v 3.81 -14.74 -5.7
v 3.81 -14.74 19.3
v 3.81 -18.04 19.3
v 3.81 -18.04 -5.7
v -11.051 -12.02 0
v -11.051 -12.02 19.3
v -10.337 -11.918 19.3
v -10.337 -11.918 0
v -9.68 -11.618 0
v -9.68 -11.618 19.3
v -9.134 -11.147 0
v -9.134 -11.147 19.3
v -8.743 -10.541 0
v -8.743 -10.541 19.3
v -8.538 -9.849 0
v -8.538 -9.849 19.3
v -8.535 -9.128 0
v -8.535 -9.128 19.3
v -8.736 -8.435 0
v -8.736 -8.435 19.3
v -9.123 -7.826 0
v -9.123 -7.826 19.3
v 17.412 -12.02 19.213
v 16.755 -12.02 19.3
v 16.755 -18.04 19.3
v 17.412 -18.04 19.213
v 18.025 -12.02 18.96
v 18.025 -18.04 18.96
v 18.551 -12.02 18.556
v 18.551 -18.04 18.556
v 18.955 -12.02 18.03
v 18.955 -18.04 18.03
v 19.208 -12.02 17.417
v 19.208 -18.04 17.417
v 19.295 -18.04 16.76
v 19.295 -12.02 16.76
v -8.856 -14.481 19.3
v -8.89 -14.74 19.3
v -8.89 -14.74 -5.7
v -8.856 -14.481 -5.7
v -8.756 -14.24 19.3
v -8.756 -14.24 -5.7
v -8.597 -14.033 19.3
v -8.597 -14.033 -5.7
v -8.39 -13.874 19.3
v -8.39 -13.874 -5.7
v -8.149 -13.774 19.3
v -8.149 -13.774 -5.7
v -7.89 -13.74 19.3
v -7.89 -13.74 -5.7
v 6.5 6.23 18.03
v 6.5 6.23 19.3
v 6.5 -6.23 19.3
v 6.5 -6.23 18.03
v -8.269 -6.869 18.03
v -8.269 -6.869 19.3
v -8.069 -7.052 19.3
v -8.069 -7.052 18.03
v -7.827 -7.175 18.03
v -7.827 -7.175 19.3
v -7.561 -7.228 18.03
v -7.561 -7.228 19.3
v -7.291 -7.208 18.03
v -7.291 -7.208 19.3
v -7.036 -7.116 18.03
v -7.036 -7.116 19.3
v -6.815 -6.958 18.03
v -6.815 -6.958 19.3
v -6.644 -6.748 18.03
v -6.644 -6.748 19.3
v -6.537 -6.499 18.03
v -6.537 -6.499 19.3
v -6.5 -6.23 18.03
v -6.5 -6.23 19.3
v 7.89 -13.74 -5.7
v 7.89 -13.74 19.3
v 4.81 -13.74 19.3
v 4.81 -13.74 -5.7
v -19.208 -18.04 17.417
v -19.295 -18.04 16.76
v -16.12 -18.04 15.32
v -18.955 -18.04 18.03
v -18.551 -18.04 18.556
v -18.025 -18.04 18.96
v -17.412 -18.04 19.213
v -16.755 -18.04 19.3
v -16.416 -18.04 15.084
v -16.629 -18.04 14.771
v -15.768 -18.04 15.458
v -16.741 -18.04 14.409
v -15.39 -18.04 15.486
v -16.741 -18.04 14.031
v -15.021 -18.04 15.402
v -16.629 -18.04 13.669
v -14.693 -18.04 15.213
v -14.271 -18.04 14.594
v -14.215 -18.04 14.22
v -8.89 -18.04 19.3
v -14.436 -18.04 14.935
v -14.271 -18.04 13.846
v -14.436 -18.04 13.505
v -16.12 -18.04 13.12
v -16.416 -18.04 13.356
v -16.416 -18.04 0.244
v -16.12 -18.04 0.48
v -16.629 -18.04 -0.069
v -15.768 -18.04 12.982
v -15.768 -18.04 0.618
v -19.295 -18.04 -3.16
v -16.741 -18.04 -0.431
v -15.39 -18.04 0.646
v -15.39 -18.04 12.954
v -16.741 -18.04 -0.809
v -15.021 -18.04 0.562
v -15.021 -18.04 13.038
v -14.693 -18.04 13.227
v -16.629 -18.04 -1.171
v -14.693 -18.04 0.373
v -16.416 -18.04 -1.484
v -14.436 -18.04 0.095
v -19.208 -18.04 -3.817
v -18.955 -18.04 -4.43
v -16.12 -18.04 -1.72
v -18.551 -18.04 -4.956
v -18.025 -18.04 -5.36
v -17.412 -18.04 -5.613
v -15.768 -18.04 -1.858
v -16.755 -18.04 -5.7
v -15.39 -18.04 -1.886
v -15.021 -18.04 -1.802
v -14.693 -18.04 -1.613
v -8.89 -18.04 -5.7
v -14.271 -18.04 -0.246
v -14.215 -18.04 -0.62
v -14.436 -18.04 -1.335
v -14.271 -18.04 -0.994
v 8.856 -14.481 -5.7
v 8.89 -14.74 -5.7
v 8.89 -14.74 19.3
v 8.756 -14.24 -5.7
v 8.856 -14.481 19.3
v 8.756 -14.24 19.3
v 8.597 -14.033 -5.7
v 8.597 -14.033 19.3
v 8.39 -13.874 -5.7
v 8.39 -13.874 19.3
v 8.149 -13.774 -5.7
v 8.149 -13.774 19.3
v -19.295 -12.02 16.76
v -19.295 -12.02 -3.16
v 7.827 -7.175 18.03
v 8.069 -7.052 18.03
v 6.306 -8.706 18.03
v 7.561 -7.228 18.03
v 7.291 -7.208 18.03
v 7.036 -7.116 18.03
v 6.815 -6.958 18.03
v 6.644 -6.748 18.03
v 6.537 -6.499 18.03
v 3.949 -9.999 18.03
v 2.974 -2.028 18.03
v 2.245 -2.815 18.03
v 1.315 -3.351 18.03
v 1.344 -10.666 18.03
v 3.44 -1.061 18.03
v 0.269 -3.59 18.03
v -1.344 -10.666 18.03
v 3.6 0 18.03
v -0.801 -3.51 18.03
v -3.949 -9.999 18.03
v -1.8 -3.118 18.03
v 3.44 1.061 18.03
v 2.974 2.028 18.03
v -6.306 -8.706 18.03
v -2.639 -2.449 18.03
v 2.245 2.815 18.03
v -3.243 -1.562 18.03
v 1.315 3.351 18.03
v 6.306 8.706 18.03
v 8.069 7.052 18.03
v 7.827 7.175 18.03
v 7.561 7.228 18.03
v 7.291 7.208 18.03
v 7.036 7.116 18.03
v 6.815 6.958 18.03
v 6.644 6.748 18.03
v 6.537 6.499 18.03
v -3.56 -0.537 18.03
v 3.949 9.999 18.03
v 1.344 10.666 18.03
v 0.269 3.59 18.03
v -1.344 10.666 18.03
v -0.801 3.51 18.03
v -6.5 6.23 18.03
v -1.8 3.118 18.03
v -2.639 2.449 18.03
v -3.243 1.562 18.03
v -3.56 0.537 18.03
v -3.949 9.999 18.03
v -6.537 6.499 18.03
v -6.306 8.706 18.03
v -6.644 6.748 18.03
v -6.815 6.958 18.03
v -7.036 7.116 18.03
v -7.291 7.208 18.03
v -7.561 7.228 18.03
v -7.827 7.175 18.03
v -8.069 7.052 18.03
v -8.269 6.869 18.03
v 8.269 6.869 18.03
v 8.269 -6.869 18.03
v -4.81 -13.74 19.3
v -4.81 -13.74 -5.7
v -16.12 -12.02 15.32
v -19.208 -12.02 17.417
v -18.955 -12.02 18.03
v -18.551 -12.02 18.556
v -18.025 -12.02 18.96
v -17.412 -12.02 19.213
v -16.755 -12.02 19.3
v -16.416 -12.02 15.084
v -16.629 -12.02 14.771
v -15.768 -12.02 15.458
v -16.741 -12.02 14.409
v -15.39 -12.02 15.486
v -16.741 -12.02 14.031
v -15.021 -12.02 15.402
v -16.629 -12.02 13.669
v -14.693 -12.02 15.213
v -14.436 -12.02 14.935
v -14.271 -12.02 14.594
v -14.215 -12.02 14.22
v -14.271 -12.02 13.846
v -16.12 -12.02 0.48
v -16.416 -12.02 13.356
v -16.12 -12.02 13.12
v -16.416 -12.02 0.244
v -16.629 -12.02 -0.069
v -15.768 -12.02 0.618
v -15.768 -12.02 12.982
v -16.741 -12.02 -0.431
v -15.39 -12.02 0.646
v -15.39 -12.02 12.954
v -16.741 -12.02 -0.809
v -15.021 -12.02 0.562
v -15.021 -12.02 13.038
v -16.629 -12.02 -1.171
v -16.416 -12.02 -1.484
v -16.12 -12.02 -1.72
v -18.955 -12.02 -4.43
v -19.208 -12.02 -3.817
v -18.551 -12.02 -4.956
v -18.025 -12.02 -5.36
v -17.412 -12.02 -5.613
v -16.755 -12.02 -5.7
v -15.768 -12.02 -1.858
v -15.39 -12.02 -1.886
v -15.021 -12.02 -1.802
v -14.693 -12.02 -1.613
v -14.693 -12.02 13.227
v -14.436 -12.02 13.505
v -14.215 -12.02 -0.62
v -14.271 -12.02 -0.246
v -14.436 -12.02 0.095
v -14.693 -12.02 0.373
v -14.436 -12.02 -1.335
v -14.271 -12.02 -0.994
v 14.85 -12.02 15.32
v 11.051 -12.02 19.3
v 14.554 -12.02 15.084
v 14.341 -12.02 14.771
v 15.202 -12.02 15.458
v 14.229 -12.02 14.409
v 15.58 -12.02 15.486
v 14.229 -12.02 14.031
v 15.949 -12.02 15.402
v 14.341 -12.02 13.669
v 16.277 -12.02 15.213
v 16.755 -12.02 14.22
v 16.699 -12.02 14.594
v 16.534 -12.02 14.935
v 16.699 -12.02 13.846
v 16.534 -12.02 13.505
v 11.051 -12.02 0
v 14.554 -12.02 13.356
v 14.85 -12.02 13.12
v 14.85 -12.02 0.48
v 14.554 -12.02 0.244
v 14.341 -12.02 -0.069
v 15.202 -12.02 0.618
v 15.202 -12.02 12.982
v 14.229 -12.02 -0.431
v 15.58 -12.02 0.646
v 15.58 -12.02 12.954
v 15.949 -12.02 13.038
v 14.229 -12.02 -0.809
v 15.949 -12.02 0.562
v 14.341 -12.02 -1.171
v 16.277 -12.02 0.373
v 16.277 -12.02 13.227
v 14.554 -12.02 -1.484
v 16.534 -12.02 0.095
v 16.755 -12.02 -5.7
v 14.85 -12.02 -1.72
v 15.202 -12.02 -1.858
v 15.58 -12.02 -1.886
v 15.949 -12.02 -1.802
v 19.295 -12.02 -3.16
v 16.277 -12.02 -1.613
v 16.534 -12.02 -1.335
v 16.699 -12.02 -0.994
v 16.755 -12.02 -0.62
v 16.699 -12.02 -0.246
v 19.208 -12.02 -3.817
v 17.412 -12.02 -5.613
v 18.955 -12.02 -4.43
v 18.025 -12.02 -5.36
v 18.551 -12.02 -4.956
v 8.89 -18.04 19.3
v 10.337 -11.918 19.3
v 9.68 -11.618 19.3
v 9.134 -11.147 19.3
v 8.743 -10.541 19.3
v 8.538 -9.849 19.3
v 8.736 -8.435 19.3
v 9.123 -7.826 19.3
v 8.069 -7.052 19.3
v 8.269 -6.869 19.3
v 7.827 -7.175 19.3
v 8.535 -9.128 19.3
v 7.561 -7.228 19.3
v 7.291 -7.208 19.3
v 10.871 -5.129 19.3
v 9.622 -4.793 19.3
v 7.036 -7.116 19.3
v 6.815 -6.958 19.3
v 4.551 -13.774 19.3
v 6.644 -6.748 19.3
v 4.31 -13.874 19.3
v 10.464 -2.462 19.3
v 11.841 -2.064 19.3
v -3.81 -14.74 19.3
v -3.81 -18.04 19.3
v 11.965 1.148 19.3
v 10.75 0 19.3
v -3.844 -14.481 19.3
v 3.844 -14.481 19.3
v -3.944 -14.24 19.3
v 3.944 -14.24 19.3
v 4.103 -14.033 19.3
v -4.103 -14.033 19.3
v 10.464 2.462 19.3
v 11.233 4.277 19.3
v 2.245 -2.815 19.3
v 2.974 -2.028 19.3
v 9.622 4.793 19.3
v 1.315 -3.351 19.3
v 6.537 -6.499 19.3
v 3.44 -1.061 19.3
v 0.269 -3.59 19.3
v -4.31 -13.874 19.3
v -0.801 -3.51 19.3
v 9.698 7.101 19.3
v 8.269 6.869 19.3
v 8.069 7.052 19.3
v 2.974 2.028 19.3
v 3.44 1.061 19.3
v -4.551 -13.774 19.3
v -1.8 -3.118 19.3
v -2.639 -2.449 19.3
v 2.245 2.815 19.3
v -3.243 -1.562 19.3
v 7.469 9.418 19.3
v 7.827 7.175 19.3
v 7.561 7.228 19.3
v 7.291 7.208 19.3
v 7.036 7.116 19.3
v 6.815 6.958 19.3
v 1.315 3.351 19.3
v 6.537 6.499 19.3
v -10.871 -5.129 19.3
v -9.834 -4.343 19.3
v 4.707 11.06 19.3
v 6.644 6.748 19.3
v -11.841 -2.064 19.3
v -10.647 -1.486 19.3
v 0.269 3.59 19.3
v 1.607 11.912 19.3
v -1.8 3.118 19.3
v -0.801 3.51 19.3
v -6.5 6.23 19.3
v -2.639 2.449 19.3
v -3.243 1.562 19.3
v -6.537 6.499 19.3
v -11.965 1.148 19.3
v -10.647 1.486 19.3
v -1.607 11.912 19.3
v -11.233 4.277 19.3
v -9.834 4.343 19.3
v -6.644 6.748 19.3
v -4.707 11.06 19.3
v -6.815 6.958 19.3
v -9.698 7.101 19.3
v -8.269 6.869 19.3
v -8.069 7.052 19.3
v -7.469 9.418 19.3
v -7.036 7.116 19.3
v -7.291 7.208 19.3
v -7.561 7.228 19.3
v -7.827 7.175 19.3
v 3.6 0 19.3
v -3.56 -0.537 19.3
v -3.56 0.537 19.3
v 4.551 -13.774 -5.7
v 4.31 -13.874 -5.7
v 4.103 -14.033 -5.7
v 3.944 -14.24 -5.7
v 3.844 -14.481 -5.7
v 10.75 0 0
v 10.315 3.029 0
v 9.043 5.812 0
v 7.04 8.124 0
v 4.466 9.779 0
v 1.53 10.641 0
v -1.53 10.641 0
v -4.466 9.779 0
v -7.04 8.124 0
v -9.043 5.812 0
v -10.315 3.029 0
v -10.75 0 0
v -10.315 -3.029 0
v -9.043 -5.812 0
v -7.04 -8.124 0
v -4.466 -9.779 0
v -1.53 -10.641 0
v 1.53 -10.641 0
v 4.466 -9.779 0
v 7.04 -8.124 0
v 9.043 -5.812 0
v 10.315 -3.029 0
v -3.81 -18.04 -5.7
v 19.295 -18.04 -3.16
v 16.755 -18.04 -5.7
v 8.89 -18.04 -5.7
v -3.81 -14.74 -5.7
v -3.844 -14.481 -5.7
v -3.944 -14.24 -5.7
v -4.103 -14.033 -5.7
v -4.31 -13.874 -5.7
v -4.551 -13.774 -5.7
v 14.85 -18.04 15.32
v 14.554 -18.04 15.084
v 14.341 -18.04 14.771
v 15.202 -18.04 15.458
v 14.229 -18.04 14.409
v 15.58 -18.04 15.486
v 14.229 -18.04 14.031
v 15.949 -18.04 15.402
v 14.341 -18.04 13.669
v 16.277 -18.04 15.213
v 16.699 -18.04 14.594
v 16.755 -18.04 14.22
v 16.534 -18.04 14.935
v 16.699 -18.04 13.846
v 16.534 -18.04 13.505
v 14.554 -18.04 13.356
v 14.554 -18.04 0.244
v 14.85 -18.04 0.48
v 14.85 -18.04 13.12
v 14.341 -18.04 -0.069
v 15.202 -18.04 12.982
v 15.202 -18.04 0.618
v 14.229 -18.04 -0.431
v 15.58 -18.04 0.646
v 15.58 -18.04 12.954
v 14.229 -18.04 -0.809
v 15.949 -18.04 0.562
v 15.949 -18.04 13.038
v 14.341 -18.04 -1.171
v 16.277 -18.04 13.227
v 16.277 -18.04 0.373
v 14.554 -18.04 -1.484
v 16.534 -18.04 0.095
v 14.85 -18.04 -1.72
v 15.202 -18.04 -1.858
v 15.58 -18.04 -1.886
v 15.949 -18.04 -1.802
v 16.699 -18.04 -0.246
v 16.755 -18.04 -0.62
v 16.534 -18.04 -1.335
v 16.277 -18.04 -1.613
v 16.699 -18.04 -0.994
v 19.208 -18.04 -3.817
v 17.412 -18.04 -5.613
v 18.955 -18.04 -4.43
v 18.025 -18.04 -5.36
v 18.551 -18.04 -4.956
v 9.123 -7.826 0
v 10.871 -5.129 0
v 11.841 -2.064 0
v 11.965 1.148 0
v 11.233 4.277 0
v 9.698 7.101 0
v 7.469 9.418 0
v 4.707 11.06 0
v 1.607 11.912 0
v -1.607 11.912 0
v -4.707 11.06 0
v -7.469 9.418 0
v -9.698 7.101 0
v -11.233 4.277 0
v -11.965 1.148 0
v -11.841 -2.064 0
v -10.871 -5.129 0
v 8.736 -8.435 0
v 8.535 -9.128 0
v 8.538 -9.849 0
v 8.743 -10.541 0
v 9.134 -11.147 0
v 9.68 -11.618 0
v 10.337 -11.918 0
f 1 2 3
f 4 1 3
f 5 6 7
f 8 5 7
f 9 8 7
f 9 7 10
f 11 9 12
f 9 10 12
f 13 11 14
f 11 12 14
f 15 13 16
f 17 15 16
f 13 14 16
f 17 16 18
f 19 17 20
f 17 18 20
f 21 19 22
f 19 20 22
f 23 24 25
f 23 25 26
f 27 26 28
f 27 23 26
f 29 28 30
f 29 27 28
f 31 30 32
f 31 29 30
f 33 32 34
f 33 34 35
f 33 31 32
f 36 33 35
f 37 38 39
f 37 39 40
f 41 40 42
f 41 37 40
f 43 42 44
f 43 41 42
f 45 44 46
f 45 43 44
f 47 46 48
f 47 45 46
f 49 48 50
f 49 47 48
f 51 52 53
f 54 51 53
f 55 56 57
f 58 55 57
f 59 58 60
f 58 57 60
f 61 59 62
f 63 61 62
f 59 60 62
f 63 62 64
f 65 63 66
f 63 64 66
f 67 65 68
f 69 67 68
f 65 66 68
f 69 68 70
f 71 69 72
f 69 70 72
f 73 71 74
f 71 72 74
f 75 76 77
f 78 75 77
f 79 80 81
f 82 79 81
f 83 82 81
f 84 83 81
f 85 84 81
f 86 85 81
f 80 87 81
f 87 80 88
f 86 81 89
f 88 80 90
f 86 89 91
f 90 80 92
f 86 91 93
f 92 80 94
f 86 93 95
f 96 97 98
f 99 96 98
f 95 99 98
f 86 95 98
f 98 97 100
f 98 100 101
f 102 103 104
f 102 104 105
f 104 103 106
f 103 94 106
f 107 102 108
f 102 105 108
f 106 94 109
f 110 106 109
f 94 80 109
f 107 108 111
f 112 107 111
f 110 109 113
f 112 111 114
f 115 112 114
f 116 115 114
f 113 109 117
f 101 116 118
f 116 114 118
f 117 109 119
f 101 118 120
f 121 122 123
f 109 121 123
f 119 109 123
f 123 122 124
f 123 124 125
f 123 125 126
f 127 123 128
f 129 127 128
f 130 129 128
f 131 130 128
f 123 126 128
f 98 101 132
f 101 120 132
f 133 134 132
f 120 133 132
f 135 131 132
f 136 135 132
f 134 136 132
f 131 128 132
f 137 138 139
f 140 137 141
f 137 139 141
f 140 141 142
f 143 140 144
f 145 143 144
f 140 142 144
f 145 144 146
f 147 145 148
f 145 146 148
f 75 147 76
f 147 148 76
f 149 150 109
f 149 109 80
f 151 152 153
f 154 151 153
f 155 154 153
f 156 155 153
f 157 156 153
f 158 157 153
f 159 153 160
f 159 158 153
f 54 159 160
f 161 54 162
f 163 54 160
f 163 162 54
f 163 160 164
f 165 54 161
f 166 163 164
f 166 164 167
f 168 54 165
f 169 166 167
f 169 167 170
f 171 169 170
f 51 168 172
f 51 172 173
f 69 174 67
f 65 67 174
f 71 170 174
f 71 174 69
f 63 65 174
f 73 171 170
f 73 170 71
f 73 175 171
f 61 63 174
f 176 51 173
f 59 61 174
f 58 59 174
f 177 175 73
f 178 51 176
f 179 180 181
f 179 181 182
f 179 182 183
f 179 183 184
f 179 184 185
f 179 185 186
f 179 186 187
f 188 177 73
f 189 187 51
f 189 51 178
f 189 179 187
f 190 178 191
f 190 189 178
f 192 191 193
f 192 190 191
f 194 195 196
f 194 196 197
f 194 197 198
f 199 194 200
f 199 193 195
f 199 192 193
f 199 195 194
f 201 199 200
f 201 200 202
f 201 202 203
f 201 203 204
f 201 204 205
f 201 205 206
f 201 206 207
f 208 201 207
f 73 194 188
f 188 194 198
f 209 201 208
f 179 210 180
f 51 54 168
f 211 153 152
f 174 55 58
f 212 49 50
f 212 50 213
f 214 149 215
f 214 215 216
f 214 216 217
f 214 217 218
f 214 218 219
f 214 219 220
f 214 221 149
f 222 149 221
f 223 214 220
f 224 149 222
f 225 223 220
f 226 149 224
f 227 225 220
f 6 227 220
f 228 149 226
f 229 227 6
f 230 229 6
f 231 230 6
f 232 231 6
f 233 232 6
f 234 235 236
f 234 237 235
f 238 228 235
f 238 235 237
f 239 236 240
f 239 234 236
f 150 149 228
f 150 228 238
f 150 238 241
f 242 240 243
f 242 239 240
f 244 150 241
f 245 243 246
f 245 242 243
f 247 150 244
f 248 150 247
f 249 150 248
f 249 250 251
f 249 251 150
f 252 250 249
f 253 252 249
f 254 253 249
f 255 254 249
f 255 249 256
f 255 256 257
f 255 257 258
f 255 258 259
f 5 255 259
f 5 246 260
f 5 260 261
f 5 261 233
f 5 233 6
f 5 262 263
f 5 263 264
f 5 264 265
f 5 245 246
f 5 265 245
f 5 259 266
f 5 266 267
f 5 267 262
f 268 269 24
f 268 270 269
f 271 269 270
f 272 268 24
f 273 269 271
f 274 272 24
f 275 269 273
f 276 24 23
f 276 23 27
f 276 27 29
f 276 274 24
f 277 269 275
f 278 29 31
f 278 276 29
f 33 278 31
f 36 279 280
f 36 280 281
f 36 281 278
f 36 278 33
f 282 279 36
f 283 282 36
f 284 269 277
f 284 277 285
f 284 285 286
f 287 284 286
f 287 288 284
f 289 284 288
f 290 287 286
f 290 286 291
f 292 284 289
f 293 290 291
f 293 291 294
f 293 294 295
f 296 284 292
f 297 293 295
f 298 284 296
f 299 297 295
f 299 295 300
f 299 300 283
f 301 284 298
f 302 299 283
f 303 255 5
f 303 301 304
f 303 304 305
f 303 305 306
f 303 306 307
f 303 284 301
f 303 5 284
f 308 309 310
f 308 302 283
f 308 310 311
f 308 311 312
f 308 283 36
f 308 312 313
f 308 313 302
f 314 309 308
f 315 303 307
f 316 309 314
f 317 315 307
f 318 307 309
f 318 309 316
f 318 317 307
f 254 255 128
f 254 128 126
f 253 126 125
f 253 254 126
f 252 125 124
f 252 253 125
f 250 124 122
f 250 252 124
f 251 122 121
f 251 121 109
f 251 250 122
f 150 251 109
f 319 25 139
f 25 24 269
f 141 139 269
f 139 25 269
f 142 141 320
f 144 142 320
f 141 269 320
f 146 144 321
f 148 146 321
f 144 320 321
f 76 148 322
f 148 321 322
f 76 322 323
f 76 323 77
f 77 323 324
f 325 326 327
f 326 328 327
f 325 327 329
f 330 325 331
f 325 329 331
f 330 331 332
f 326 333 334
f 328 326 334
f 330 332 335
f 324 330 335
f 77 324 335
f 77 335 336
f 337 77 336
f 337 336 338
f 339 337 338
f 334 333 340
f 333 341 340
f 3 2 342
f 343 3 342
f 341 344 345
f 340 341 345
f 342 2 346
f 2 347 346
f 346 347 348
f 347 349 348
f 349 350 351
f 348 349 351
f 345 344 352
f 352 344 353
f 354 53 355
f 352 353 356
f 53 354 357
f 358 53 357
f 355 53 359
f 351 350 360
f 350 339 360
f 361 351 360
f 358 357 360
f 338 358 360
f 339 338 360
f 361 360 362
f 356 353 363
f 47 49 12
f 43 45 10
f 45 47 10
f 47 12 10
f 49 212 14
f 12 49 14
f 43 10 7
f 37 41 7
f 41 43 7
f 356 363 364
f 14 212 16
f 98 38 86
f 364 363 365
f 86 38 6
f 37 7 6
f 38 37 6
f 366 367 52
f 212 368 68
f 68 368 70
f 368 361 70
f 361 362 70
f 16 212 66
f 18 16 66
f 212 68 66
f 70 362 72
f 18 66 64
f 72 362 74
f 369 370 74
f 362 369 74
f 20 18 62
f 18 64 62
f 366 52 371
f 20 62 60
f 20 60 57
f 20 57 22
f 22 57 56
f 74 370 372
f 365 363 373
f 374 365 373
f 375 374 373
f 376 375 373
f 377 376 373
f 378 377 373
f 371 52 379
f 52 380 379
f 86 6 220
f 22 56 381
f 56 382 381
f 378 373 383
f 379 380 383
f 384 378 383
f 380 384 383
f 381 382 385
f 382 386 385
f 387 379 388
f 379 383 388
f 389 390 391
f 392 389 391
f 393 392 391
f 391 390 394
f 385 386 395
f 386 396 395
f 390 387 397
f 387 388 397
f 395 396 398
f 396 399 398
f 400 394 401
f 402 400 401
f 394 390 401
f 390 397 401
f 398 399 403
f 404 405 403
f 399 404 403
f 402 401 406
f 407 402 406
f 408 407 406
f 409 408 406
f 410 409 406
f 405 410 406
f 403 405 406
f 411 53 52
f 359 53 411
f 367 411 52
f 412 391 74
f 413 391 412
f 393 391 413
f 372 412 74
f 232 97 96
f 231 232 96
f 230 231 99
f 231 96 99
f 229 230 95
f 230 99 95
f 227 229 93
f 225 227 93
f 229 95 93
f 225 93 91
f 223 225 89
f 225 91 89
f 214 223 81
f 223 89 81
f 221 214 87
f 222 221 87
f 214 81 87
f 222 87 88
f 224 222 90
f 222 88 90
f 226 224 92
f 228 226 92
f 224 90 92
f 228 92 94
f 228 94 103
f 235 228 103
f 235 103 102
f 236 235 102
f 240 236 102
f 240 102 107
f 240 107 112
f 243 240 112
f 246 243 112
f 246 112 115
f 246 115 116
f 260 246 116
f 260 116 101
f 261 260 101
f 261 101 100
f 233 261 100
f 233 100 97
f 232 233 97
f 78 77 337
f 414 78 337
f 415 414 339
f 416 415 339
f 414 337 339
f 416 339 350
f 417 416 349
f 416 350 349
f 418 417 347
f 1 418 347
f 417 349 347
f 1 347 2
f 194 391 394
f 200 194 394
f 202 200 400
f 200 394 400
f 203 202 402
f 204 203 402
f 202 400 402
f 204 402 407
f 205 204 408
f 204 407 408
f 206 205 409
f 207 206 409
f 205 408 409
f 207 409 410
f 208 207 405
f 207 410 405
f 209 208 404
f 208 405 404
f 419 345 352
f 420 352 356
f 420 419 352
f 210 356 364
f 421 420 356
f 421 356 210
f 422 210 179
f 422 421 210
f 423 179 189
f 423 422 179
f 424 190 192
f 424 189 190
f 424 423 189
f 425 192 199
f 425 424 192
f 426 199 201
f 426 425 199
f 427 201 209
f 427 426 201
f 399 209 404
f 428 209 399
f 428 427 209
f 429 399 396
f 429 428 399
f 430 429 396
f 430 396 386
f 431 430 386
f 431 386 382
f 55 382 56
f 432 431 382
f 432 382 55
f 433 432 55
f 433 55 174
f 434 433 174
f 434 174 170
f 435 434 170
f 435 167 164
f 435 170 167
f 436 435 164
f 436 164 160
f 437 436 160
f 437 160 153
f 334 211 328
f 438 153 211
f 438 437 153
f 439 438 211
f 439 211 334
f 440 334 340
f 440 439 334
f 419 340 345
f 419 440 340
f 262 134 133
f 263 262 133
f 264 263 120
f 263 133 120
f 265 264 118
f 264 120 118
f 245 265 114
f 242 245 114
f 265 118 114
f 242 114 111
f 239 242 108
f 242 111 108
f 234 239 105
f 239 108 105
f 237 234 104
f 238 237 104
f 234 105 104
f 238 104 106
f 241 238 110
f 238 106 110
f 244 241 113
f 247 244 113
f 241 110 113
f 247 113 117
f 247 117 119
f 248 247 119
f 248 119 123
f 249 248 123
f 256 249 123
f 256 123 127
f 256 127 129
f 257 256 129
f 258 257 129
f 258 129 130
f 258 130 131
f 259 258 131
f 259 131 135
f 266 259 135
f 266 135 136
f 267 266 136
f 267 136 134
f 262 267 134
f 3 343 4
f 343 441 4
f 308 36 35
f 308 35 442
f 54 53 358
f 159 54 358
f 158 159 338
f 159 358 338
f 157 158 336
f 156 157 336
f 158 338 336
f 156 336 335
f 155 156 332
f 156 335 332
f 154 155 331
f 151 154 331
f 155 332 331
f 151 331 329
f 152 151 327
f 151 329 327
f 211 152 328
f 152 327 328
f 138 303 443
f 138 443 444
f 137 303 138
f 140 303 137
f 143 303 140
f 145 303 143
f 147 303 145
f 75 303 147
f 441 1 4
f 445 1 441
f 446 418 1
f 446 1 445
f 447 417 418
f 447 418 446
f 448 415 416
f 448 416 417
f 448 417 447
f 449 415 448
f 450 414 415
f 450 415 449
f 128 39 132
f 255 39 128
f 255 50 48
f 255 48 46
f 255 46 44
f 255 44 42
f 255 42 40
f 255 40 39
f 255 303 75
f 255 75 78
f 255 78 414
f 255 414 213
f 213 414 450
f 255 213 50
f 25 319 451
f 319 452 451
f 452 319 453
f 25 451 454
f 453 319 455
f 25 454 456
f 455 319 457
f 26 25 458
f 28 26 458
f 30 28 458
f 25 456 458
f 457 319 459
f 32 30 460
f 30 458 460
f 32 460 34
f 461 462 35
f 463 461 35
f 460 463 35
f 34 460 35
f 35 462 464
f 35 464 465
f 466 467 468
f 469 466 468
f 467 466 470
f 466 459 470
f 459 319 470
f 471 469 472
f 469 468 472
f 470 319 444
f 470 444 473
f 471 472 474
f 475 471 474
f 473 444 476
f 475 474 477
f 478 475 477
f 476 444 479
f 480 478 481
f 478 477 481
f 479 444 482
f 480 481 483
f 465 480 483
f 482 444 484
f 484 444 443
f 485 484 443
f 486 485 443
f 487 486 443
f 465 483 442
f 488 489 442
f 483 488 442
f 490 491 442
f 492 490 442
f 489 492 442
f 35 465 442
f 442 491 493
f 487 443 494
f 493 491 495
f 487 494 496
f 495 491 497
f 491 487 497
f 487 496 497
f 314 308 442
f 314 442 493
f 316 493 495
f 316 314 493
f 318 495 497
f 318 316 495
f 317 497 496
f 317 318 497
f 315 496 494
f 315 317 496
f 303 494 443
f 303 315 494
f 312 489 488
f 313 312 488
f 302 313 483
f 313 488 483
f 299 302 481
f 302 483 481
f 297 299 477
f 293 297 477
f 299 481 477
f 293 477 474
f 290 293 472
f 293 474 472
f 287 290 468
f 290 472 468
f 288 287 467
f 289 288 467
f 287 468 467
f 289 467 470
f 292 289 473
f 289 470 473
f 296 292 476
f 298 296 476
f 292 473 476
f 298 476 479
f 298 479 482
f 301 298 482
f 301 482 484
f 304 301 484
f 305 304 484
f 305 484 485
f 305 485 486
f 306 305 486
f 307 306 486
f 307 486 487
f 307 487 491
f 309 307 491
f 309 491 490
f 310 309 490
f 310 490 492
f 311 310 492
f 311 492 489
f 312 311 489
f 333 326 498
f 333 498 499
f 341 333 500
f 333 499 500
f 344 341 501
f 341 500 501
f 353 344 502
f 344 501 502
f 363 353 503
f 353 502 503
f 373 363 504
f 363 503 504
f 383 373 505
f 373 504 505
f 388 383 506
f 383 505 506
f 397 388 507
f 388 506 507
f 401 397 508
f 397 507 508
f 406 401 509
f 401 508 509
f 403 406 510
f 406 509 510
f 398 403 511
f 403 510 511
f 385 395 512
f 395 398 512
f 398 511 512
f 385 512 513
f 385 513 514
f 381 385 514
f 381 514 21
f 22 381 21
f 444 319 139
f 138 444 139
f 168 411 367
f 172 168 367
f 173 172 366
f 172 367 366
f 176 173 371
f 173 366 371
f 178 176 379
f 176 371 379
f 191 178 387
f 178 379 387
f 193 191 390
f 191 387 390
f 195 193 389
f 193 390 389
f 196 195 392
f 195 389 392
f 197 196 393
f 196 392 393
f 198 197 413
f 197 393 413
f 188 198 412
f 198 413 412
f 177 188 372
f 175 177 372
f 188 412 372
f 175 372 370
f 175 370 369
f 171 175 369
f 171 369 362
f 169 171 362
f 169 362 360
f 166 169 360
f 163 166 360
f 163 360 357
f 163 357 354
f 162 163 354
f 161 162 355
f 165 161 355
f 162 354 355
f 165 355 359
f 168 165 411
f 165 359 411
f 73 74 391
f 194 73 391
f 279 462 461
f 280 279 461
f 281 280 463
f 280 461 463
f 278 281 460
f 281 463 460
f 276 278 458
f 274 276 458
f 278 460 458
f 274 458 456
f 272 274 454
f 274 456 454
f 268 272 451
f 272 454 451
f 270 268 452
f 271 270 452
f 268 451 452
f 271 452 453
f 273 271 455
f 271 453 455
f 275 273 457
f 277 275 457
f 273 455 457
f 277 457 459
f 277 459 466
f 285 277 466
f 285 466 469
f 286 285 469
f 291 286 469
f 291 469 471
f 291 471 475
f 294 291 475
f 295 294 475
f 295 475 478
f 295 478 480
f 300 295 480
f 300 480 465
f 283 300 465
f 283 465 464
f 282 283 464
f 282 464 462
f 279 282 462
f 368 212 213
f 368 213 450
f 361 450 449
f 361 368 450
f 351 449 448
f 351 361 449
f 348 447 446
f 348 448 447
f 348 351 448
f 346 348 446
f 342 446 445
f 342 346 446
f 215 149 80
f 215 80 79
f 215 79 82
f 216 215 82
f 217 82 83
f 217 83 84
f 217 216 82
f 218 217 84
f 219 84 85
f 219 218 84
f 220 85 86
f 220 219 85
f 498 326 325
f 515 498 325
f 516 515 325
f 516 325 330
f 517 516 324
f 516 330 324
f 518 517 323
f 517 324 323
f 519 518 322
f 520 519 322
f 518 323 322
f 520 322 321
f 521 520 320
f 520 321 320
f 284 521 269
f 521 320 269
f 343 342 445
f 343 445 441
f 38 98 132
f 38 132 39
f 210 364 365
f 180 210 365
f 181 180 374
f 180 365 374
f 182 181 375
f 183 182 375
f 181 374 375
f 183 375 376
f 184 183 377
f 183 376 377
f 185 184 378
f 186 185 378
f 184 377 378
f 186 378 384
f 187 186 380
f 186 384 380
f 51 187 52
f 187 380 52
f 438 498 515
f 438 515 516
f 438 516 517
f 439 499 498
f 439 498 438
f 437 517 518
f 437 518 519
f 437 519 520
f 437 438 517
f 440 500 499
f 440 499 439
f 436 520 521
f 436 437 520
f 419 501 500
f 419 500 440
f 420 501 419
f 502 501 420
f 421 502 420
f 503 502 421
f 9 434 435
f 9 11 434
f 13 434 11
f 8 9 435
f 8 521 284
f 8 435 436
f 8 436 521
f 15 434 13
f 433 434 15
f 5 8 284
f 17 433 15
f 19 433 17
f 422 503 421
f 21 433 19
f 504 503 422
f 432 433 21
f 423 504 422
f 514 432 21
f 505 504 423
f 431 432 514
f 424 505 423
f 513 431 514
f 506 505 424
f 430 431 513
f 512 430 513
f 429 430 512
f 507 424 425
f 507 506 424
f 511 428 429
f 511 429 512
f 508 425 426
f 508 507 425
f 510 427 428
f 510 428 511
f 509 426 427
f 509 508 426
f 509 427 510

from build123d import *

# Parameters (mm, degrees)
SKETCH2_R           = 12.02
SKETCH2_R_2         = 10.75
BOSS_EXTRUDE1_DEPTH = 19.3
SKETCH3_R           = 3.6
BOSS_EXTRUDE4_DEPTH = 1.27
BOSS_EXTRUDE5_DEPTH = 6.02
BOSS_EXTRUDE6_DEPTH = 19.3
CUT_EXTRUDE1_DEPTH  = 26
SKETCH7_R           = 1.27
CUT_EXTRUDE2_DEPTH  = 31.06


with BuildPart() as part:
    # Sketch2 → Boss-Extrude1 (new body)
    with BuildSketch(Plane.XY):
        Circle(SKETCH2_R)
        Circle(SKETCH2_R_2, mode=Mode.SUBTRACT)
    extrude(amount=BOSS_EXTRUDE1_DEPTH)

    # Sketch3 → Boss-Extrude4 (add)
    with BuildSketch(Plane.XY.offset(19.3)):
        with BuildLine():
            Line((-6.5, -6.229967897), (-6.5, 6.229967897))
            ThreePointArc((-6.5, 6.229967897), (-7.16031689, 7.17050784), (-8.269230769, 6.868938964))
            ThreePointArc((-8.269230769, 6.868938964), (0, 10.75), (8.269230769, 6.868938964))
            ThreePointArc((8.269230769, 6.868938964), (7.16031689, 7.17050784), (6.5, 6.229967897))
            Line((6.5, 6.229967897), (6.5, -6.229967897))
            ThreePointArc((6.5, -6.229967897), (7.16031689, -7.17050784), (8.269230769, -6.868938964))
            ThreePointArc((8.269230769, -6.868938964), (0, -10.75), (-8.269230769, -6.868938964))
            ThreePointArc((-8.269230769, -6.868938964), (-7.16031689, -7.17050784), (-6.5, -6.229967897))
        make_face()
        Circle(SKETCH3_R, mode=Mode.SUBTRACT)
    extrude(amount=-BOSS_EXTRUDE4_DEPTH)



with BuildPart() as body_2:
    # Sketch4 → Boss-Extrude5 (new body)
    with BuildSketch(Plane(origin=(0, -12.02, 0), x_dir=(1, 0, 0), z_dir=(0, 1, 0))):
        with BuildLine():
            Line((-12.02, -19.3), (12.02, -19.3))
            Line((12.02, -19.3), (16.755, -19.3))
            ThreePointArc((16.755, -19.3), (18.551051224, -18.556051224), (19.295, -16.76))
            Line((19.295, -16.76), (19.295, 3.16))
            ThreePointArc((19.295, 3.16), (18.551051224, 4.956051224), (16.755, 5.7))
            Line((16.755, 5.7), (-16.755, 5.7))
            ThreePointArc((-16.755, 5.7), (-18.551051224, 4.956051224), (-19.295, 3.16))
            Line((-19.295, 3.16), (-19.295, -16.76))
            ThreePointArc((-19.295, -16.76), (-18.551051224, -18.556051224), (-16.755, -19.3))
            Line((-16.755, -19.3), (-12.02, -19.3))
        make_face()
    extrude(amount=-BOSS_EXTRUDE5_DEPTH)


with BuildPart() as part_1:
    add(part.part)

    add(body_2.part)  # Boss-Extrude6 merges body 2
    # Sketch5 → Boss-Extrude6 (add)
    with BuildSketch(Plane.XY.offset(19.3)):
        with BuildLine():
            Line((-10, -12.02), (-11.050936612, -12.02))
            ThreePointArc((-11.050936612, -12.02), (-8.743098915, -10.540888856), (-9.123094648, -7.826208791))
            ThreePointArc((-9.123094648, -7.826208791), (0, -12.02), (9.123094648, -7.826208791))
            ThreePointArc((9.123094648, -7.826208791), (8.743098915, -10.540888856), (11.050936612, -12.02))
            Line((11.050936612, -12.02), (10, -12.02))
            Line((10, -12.02), (10, -18.04))
            Line((10, -18.04), (-10, -18.04))
            Line((-10, -18.04), (-10, -12.02))
        make_face()
    extrude(amount=-BOSS_EXTRUDE6_DEPTH)

    # Sketch6 → Cut-Extrude1 (cut, through all)
    with BuildSketch(Plane.XY.offset(19.3)):
        with BuildLine():
            Line((-8.89, -18.04), (-8.89, -14.74))
            ThreePointArc((-8.89, -14.74), (-8.597106781, -14.032893219), (-7.89, -13.74))
            Line((-7.89, -13.74), (-4.81, -13.74))
            ThreePointArc((-4.81, -13.74), (-4.102893219, -14.032893219), (-3.81, -14.74))
            Line((-3.81, -14.74), (-3.81, -18.04))
            Line((-3.81, -18.04), (-8.89, -18.04))
        make_face()
        with BuildLine():
            Line((3.81, -14.74), (3.81, -18.04))
            Line((3.81, -18.04), (8.89, -18.04))
            Line((8.89, -18.04), (8.89, -14.74))
            ThreePointArc((8.89, -14.74), (8.597106781, -14.032893219), (7.89, -13.74))
            Line((7.89, -13.74), (4.81, -13.74))
            ThreePointArc((4.81, -13.74), (4.102893219, -14.032893219), (3.81, -14.74))
        make_face()
    extrude(amount=-CUT_EXTRUDE1_DEPTH, mode=Mode.SUBTRACT)

    # Sketch7 → Cut-Extrude2 (cut, through all)
    with BuildSketch(Plane.XZ.offset(18.04)):
        with Locations((-15.485, 14.22)):
            Circle(SKETCH7_R)
        with Locations((15.485, 14.22)):
            Circle(SKETCH7_R)
        with Locations((-15.485, -0.62)):
            Circle(SKETCH7_R)
        with Locations((15.485, -0.62)):
            Circle(SKETCH7_R)
    extrude(amount=-CUT_EXTRUDE2_DEPTH, mode=Mode.SUBTRACT)


solid = part_1.part
